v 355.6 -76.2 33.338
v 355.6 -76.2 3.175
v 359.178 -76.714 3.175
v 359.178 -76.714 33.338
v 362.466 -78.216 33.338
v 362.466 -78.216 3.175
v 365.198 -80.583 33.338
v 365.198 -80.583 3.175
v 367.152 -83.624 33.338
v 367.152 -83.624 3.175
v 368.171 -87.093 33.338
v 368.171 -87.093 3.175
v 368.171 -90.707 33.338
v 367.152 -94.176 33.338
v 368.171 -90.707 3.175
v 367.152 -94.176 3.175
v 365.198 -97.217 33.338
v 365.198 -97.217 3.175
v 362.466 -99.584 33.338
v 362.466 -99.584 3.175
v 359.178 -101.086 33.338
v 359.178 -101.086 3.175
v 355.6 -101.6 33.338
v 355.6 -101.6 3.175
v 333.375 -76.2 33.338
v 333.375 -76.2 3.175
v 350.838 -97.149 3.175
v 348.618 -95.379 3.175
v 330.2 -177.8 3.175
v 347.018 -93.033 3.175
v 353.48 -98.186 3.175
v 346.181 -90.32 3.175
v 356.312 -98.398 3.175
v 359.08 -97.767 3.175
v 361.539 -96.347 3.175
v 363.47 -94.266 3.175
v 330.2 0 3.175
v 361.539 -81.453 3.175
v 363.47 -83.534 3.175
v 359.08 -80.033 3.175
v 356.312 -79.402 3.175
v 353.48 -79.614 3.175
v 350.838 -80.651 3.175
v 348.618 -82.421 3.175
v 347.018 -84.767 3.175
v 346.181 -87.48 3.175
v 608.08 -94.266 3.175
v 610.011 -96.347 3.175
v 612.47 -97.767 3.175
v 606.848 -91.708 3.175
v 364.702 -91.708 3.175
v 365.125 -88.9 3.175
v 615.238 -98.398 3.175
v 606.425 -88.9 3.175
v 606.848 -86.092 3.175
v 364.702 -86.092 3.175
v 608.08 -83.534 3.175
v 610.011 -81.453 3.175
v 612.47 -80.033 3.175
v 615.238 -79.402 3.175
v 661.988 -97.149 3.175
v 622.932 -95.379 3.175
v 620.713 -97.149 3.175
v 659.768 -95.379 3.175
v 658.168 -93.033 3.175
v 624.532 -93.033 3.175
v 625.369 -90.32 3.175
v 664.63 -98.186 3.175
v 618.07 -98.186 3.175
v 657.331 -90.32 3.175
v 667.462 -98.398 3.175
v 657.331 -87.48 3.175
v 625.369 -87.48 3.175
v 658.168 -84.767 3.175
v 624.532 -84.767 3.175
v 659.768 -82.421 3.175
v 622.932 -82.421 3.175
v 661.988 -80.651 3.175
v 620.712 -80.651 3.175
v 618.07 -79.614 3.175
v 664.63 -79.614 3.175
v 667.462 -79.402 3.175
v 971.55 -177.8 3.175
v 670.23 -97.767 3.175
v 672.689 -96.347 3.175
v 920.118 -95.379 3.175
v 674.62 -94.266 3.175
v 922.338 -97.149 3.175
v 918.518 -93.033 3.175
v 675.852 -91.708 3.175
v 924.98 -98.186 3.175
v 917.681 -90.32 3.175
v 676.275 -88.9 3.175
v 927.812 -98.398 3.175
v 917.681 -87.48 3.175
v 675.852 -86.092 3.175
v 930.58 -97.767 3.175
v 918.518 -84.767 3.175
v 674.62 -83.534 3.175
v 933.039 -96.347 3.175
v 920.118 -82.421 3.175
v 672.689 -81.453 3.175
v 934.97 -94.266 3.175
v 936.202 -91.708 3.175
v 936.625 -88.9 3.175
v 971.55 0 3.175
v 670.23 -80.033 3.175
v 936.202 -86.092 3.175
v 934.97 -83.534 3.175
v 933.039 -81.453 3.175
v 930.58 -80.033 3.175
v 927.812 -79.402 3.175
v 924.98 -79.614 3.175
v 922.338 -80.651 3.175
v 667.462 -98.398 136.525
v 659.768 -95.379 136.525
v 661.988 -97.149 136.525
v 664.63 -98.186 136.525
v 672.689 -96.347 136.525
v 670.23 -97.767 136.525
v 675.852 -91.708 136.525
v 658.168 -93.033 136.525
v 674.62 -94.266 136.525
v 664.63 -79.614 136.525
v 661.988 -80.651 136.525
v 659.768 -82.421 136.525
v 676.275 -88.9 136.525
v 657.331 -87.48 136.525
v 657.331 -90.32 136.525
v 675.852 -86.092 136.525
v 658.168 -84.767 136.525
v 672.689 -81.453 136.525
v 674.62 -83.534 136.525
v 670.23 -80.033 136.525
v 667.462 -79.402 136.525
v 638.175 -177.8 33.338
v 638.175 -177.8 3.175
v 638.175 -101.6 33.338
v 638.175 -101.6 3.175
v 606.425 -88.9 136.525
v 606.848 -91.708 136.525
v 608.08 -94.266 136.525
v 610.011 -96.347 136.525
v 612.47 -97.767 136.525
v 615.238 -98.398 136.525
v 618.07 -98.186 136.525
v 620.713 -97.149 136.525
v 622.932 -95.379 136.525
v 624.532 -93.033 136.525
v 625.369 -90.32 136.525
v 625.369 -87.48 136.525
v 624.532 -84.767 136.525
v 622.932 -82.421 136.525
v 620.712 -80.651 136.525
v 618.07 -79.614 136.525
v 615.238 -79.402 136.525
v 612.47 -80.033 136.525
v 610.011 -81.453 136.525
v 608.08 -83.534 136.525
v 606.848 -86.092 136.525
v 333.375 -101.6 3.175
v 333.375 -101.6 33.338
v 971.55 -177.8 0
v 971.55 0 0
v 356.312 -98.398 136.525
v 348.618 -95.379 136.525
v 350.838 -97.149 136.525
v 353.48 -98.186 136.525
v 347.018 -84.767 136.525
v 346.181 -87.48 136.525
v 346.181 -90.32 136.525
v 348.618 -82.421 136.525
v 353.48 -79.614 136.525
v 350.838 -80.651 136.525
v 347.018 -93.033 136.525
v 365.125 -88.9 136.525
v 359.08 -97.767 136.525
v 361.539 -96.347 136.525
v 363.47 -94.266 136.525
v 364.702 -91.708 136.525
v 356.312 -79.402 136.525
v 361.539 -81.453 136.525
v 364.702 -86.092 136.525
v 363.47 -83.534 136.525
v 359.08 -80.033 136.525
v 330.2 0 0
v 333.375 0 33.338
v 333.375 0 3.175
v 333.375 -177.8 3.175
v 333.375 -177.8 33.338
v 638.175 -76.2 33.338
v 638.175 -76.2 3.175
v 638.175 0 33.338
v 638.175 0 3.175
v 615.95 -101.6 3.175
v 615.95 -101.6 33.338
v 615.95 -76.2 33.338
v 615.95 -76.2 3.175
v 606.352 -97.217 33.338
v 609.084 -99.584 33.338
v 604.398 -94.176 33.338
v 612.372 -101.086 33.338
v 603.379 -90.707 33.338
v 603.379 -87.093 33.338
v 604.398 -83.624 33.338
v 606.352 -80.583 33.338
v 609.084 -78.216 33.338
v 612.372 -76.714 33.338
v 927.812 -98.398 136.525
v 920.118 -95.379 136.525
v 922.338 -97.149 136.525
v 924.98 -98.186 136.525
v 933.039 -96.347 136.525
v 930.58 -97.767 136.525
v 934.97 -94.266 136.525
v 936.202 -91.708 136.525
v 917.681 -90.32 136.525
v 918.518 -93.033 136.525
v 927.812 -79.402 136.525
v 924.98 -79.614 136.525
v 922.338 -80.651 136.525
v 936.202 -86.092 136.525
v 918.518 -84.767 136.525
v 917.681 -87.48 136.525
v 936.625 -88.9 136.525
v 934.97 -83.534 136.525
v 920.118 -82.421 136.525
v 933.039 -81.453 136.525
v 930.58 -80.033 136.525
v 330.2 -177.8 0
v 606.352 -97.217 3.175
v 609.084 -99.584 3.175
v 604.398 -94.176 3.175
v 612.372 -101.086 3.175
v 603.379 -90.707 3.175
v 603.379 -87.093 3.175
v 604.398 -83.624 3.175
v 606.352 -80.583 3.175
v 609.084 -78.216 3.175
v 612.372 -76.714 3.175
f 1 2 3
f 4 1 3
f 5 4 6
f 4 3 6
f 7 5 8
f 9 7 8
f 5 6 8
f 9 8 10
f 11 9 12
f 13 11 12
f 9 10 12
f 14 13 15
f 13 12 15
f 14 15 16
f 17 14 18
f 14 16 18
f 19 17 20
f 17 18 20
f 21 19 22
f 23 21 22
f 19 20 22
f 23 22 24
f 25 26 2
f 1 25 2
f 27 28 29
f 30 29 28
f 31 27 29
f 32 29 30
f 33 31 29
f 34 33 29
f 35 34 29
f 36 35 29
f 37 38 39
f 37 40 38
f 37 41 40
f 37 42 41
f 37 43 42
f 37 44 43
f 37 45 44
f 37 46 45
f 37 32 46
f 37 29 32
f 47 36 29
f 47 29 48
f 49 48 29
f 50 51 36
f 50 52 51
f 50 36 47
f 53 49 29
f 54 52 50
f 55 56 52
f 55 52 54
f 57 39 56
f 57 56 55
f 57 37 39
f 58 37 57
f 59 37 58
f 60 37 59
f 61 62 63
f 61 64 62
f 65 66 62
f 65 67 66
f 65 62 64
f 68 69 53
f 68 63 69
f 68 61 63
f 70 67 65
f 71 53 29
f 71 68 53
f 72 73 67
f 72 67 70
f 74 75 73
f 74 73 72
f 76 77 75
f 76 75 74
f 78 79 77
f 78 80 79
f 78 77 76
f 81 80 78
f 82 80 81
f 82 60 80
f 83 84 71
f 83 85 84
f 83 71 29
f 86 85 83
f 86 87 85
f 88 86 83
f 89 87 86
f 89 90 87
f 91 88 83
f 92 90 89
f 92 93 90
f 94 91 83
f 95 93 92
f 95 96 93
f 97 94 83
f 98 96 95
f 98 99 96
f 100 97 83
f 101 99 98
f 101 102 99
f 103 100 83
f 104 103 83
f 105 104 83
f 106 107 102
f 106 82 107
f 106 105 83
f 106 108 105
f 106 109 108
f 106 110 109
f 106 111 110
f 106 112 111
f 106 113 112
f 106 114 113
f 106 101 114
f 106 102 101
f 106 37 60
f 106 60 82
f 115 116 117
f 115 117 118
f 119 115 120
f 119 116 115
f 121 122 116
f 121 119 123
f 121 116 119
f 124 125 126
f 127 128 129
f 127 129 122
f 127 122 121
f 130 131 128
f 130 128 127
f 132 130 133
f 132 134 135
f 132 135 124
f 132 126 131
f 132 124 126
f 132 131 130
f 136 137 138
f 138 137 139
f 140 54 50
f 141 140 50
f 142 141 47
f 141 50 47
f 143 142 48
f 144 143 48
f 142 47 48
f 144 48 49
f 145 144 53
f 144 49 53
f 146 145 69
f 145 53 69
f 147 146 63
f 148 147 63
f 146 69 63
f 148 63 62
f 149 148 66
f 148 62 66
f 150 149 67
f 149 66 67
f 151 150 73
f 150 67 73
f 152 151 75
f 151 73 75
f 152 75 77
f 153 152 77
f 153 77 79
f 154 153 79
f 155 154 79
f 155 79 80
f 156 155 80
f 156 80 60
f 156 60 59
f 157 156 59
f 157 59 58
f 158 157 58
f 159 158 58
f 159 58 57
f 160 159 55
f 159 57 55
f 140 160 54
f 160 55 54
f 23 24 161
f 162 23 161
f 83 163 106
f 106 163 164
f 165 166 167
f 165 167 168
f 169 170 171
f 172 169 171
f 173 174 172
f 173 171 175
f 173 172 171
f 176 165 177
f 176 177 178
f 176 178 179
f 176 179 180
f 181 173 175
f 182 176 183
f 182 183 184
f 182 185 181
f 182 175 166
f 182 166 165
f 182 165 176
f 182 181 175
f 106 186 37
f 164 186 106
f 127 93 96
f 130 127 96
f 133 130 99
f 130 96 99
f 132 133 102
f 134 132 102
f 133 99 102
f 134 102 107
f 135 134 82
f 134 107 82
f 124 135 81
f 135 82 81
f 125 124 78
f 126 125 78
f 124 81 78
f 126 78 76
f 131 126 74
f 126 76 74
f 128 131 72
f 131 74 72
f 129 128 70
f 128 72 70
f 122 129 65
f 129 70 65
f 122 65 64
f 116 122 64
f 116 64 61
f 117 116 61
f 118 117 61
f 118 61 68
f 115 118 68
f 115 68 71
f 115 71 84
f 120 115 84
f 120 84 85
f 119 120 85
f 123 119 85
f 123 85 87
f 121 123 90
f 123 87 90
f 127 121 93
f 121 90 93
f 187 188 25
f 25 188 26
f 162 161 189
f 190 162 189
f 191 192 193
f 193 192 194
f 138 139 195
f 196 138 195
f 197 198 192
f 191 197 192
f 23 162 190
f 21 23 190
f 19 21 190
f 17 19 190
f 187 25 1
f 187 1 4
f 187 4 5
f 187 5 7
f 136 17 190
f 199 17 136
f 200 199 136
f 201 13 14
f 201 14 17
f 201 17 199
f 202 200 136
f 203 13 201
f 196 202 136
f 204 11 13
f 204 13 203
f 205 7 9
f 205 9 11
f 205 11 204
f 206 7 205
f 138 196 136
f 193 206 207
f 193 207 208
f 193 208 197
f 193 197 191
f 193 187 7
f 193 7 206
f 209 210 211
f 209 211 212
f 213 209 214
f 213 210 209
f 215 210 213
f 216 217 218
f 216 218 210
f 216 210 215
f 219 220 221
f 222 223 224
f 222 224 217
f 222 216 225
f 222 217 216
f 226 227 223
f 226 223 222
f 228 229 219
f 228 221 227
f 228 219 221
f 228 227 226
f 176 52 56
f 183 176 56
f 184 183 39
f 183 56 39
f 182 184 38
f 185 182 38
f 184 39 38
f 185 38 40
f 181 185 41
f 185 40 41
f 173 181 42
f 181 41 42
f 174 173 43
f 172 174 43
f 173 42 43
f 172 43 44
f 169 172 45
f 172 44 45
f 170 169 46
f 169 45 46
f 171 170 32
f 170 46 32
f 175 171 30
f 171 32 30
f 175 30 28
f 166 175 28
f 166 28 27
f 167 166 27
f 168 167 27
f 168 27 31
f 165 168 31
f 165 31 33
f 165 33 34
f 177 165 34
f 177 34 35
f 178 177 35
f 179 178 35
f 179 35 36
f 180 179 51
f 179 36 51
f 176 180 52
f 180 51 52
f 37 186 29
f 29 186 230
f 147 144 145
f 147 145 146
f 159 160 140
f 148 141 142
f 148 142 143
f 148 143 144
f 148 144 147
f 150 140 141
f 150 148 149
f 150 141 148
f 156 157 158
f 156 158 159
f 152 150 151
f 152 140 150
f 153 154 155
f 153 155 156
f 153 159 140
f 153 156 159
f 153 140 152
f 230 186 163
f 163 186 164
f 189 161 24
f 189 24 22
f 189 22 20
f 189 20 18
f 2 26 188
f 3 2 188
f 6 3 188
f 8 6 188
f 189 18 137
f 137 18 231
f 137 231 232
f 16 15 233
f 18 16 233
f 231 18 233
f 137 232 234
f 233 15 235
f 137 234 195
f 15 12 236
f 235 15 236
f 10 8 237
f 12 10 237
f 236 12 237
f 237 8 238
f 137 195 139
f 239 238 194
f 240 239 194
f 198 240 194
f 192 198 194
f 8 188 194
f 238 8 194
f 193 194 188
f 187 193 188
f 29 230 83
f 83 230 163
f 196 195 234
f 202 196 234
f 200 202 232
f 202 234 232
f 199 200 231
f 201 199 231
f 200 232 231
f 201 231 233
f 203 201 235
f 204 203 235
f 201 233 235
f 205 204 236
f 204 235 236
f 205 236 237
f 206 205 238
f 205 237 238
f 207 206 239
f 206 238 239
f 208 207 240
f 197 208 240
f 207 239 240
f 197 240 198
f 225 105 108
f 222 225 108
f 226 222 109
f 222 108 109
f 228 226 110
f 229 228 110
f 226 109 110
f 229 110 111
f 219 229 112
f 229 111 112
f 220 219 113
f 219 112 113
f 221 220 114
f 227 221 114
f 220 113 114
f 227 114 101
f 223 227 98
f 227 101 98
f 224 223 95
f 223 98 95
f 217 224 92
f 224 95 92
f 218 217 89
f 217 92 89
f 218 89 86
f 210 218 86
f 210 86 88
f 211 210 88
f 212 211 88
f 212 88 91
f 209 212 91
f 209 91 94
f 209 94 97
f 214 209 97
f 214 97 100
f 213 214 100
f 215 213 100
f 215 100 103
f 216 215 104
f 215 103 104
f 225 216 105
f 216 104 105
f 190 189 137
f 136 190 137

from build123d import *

# Parameters (mm, degrees)
F0_W     = 971.55
F0_H     = 177.8
F1_DEPTH = 3.175
F2_R     = 9.525
F3_DEPTH = 133.35
F4_W     = 330.2
F4_H     = 177.8
F5_DEPTH = 136.526
F7_DEPTH = 30.1625


with BuildPart() as f1:
    # F0 (on Top) → F1 (new body)
    with BuildSketch(Plane.XY):
        with Locations((485.775, -88.9)):
            Rectangle(F0_W, F0_H)
    extrude(amount=F1_DEPTH)

    # F2 (on face) → F3 (join)
    with BuildSketch(Plane.XY.offset(3.175)):
        with Locations((43.688, -88.9)):
            Circle(F2_R)
        with BuildLine():
            Line((311.15, -95.236015), (311.15, -82.563985))
            ThreePointArc((311.15, -82.563985), (300.648028, -79.998668), (294.513, -88.9))
            ThreePointArc((294.513, -88.9), (300.648028, -97.801332), (311.15, -95.236015))
        make_face()
        with Locations((355.6, -88.9)):
            Circle(F2_R)
        with BuildLine():
            ThreePointArc((625.475, -88.9), (615.95, -79.375), (606.425, -88.9))
            ThreePointArc((606.425, -88.9), (615.95, -98.425), (625.475, -88.9))
        make_face()
        with Locations((666.75, -88.9)):
            Circle(F2_R)
        with BuildLine():
            ThreePointArc((917.575, -88.9), (927.1, -98.425), (936.625, -88.9))
            ThreePointArc((936.625, -88.9), (927.1, -79.375), (917.575, -88.9))
        make_face()
    extrude(amount=F3_DEPTH)

    # F4 (on face) → F5 (cut, through all)
    with BuildSketch(Plane(origin=(0, 0, 0), x_dir=(1, 0, 0), z_dir=(0, 0, -1))):
        with Locations((165.1, 88.9)):
            Rectangle(F4_W, F4_H)
    extrude(amount=-F5_DEPTH, mode=Mode.SUBTRACT)


with BuildPart() as f7:
    # F6 (on face) → F7 (new body)
    with BuildSketch(Plane.XY.offset(3.175)):
        with BuildLine():
            Line((638.175, 0), (333.375, 0))
            Line((333.375, 0), (333.375, -76.2))
            Line((333.375, -76.2), (355.6, -76.2))
            ThreePointArc((355.6, -76.2), (368.3, -88.9), (355.6, -101.6))
            Line((355.6, -101.6), (333.375, -101.6))
            Line((333.375, -101.6), (333.375, -177.8))
            Line((333.375, -177.8), (638.175, -177.8))
            Line((638.175, -177.8), (638.175, -101.6))
            Line((638.175, -101.6), (615.95, -101.6))
            ThreePointArc((615.95, -101.6), (603.25, -88.9), (615.95, -76.2))
            Line((615.95, -76.2), (638.175, -76.2))
            Line((638.175, -76.2), (638.175, 0))
        make_face()
    extrude(amount=F7_DEPTH)


solid = Compound([f1.part, f7.part])
